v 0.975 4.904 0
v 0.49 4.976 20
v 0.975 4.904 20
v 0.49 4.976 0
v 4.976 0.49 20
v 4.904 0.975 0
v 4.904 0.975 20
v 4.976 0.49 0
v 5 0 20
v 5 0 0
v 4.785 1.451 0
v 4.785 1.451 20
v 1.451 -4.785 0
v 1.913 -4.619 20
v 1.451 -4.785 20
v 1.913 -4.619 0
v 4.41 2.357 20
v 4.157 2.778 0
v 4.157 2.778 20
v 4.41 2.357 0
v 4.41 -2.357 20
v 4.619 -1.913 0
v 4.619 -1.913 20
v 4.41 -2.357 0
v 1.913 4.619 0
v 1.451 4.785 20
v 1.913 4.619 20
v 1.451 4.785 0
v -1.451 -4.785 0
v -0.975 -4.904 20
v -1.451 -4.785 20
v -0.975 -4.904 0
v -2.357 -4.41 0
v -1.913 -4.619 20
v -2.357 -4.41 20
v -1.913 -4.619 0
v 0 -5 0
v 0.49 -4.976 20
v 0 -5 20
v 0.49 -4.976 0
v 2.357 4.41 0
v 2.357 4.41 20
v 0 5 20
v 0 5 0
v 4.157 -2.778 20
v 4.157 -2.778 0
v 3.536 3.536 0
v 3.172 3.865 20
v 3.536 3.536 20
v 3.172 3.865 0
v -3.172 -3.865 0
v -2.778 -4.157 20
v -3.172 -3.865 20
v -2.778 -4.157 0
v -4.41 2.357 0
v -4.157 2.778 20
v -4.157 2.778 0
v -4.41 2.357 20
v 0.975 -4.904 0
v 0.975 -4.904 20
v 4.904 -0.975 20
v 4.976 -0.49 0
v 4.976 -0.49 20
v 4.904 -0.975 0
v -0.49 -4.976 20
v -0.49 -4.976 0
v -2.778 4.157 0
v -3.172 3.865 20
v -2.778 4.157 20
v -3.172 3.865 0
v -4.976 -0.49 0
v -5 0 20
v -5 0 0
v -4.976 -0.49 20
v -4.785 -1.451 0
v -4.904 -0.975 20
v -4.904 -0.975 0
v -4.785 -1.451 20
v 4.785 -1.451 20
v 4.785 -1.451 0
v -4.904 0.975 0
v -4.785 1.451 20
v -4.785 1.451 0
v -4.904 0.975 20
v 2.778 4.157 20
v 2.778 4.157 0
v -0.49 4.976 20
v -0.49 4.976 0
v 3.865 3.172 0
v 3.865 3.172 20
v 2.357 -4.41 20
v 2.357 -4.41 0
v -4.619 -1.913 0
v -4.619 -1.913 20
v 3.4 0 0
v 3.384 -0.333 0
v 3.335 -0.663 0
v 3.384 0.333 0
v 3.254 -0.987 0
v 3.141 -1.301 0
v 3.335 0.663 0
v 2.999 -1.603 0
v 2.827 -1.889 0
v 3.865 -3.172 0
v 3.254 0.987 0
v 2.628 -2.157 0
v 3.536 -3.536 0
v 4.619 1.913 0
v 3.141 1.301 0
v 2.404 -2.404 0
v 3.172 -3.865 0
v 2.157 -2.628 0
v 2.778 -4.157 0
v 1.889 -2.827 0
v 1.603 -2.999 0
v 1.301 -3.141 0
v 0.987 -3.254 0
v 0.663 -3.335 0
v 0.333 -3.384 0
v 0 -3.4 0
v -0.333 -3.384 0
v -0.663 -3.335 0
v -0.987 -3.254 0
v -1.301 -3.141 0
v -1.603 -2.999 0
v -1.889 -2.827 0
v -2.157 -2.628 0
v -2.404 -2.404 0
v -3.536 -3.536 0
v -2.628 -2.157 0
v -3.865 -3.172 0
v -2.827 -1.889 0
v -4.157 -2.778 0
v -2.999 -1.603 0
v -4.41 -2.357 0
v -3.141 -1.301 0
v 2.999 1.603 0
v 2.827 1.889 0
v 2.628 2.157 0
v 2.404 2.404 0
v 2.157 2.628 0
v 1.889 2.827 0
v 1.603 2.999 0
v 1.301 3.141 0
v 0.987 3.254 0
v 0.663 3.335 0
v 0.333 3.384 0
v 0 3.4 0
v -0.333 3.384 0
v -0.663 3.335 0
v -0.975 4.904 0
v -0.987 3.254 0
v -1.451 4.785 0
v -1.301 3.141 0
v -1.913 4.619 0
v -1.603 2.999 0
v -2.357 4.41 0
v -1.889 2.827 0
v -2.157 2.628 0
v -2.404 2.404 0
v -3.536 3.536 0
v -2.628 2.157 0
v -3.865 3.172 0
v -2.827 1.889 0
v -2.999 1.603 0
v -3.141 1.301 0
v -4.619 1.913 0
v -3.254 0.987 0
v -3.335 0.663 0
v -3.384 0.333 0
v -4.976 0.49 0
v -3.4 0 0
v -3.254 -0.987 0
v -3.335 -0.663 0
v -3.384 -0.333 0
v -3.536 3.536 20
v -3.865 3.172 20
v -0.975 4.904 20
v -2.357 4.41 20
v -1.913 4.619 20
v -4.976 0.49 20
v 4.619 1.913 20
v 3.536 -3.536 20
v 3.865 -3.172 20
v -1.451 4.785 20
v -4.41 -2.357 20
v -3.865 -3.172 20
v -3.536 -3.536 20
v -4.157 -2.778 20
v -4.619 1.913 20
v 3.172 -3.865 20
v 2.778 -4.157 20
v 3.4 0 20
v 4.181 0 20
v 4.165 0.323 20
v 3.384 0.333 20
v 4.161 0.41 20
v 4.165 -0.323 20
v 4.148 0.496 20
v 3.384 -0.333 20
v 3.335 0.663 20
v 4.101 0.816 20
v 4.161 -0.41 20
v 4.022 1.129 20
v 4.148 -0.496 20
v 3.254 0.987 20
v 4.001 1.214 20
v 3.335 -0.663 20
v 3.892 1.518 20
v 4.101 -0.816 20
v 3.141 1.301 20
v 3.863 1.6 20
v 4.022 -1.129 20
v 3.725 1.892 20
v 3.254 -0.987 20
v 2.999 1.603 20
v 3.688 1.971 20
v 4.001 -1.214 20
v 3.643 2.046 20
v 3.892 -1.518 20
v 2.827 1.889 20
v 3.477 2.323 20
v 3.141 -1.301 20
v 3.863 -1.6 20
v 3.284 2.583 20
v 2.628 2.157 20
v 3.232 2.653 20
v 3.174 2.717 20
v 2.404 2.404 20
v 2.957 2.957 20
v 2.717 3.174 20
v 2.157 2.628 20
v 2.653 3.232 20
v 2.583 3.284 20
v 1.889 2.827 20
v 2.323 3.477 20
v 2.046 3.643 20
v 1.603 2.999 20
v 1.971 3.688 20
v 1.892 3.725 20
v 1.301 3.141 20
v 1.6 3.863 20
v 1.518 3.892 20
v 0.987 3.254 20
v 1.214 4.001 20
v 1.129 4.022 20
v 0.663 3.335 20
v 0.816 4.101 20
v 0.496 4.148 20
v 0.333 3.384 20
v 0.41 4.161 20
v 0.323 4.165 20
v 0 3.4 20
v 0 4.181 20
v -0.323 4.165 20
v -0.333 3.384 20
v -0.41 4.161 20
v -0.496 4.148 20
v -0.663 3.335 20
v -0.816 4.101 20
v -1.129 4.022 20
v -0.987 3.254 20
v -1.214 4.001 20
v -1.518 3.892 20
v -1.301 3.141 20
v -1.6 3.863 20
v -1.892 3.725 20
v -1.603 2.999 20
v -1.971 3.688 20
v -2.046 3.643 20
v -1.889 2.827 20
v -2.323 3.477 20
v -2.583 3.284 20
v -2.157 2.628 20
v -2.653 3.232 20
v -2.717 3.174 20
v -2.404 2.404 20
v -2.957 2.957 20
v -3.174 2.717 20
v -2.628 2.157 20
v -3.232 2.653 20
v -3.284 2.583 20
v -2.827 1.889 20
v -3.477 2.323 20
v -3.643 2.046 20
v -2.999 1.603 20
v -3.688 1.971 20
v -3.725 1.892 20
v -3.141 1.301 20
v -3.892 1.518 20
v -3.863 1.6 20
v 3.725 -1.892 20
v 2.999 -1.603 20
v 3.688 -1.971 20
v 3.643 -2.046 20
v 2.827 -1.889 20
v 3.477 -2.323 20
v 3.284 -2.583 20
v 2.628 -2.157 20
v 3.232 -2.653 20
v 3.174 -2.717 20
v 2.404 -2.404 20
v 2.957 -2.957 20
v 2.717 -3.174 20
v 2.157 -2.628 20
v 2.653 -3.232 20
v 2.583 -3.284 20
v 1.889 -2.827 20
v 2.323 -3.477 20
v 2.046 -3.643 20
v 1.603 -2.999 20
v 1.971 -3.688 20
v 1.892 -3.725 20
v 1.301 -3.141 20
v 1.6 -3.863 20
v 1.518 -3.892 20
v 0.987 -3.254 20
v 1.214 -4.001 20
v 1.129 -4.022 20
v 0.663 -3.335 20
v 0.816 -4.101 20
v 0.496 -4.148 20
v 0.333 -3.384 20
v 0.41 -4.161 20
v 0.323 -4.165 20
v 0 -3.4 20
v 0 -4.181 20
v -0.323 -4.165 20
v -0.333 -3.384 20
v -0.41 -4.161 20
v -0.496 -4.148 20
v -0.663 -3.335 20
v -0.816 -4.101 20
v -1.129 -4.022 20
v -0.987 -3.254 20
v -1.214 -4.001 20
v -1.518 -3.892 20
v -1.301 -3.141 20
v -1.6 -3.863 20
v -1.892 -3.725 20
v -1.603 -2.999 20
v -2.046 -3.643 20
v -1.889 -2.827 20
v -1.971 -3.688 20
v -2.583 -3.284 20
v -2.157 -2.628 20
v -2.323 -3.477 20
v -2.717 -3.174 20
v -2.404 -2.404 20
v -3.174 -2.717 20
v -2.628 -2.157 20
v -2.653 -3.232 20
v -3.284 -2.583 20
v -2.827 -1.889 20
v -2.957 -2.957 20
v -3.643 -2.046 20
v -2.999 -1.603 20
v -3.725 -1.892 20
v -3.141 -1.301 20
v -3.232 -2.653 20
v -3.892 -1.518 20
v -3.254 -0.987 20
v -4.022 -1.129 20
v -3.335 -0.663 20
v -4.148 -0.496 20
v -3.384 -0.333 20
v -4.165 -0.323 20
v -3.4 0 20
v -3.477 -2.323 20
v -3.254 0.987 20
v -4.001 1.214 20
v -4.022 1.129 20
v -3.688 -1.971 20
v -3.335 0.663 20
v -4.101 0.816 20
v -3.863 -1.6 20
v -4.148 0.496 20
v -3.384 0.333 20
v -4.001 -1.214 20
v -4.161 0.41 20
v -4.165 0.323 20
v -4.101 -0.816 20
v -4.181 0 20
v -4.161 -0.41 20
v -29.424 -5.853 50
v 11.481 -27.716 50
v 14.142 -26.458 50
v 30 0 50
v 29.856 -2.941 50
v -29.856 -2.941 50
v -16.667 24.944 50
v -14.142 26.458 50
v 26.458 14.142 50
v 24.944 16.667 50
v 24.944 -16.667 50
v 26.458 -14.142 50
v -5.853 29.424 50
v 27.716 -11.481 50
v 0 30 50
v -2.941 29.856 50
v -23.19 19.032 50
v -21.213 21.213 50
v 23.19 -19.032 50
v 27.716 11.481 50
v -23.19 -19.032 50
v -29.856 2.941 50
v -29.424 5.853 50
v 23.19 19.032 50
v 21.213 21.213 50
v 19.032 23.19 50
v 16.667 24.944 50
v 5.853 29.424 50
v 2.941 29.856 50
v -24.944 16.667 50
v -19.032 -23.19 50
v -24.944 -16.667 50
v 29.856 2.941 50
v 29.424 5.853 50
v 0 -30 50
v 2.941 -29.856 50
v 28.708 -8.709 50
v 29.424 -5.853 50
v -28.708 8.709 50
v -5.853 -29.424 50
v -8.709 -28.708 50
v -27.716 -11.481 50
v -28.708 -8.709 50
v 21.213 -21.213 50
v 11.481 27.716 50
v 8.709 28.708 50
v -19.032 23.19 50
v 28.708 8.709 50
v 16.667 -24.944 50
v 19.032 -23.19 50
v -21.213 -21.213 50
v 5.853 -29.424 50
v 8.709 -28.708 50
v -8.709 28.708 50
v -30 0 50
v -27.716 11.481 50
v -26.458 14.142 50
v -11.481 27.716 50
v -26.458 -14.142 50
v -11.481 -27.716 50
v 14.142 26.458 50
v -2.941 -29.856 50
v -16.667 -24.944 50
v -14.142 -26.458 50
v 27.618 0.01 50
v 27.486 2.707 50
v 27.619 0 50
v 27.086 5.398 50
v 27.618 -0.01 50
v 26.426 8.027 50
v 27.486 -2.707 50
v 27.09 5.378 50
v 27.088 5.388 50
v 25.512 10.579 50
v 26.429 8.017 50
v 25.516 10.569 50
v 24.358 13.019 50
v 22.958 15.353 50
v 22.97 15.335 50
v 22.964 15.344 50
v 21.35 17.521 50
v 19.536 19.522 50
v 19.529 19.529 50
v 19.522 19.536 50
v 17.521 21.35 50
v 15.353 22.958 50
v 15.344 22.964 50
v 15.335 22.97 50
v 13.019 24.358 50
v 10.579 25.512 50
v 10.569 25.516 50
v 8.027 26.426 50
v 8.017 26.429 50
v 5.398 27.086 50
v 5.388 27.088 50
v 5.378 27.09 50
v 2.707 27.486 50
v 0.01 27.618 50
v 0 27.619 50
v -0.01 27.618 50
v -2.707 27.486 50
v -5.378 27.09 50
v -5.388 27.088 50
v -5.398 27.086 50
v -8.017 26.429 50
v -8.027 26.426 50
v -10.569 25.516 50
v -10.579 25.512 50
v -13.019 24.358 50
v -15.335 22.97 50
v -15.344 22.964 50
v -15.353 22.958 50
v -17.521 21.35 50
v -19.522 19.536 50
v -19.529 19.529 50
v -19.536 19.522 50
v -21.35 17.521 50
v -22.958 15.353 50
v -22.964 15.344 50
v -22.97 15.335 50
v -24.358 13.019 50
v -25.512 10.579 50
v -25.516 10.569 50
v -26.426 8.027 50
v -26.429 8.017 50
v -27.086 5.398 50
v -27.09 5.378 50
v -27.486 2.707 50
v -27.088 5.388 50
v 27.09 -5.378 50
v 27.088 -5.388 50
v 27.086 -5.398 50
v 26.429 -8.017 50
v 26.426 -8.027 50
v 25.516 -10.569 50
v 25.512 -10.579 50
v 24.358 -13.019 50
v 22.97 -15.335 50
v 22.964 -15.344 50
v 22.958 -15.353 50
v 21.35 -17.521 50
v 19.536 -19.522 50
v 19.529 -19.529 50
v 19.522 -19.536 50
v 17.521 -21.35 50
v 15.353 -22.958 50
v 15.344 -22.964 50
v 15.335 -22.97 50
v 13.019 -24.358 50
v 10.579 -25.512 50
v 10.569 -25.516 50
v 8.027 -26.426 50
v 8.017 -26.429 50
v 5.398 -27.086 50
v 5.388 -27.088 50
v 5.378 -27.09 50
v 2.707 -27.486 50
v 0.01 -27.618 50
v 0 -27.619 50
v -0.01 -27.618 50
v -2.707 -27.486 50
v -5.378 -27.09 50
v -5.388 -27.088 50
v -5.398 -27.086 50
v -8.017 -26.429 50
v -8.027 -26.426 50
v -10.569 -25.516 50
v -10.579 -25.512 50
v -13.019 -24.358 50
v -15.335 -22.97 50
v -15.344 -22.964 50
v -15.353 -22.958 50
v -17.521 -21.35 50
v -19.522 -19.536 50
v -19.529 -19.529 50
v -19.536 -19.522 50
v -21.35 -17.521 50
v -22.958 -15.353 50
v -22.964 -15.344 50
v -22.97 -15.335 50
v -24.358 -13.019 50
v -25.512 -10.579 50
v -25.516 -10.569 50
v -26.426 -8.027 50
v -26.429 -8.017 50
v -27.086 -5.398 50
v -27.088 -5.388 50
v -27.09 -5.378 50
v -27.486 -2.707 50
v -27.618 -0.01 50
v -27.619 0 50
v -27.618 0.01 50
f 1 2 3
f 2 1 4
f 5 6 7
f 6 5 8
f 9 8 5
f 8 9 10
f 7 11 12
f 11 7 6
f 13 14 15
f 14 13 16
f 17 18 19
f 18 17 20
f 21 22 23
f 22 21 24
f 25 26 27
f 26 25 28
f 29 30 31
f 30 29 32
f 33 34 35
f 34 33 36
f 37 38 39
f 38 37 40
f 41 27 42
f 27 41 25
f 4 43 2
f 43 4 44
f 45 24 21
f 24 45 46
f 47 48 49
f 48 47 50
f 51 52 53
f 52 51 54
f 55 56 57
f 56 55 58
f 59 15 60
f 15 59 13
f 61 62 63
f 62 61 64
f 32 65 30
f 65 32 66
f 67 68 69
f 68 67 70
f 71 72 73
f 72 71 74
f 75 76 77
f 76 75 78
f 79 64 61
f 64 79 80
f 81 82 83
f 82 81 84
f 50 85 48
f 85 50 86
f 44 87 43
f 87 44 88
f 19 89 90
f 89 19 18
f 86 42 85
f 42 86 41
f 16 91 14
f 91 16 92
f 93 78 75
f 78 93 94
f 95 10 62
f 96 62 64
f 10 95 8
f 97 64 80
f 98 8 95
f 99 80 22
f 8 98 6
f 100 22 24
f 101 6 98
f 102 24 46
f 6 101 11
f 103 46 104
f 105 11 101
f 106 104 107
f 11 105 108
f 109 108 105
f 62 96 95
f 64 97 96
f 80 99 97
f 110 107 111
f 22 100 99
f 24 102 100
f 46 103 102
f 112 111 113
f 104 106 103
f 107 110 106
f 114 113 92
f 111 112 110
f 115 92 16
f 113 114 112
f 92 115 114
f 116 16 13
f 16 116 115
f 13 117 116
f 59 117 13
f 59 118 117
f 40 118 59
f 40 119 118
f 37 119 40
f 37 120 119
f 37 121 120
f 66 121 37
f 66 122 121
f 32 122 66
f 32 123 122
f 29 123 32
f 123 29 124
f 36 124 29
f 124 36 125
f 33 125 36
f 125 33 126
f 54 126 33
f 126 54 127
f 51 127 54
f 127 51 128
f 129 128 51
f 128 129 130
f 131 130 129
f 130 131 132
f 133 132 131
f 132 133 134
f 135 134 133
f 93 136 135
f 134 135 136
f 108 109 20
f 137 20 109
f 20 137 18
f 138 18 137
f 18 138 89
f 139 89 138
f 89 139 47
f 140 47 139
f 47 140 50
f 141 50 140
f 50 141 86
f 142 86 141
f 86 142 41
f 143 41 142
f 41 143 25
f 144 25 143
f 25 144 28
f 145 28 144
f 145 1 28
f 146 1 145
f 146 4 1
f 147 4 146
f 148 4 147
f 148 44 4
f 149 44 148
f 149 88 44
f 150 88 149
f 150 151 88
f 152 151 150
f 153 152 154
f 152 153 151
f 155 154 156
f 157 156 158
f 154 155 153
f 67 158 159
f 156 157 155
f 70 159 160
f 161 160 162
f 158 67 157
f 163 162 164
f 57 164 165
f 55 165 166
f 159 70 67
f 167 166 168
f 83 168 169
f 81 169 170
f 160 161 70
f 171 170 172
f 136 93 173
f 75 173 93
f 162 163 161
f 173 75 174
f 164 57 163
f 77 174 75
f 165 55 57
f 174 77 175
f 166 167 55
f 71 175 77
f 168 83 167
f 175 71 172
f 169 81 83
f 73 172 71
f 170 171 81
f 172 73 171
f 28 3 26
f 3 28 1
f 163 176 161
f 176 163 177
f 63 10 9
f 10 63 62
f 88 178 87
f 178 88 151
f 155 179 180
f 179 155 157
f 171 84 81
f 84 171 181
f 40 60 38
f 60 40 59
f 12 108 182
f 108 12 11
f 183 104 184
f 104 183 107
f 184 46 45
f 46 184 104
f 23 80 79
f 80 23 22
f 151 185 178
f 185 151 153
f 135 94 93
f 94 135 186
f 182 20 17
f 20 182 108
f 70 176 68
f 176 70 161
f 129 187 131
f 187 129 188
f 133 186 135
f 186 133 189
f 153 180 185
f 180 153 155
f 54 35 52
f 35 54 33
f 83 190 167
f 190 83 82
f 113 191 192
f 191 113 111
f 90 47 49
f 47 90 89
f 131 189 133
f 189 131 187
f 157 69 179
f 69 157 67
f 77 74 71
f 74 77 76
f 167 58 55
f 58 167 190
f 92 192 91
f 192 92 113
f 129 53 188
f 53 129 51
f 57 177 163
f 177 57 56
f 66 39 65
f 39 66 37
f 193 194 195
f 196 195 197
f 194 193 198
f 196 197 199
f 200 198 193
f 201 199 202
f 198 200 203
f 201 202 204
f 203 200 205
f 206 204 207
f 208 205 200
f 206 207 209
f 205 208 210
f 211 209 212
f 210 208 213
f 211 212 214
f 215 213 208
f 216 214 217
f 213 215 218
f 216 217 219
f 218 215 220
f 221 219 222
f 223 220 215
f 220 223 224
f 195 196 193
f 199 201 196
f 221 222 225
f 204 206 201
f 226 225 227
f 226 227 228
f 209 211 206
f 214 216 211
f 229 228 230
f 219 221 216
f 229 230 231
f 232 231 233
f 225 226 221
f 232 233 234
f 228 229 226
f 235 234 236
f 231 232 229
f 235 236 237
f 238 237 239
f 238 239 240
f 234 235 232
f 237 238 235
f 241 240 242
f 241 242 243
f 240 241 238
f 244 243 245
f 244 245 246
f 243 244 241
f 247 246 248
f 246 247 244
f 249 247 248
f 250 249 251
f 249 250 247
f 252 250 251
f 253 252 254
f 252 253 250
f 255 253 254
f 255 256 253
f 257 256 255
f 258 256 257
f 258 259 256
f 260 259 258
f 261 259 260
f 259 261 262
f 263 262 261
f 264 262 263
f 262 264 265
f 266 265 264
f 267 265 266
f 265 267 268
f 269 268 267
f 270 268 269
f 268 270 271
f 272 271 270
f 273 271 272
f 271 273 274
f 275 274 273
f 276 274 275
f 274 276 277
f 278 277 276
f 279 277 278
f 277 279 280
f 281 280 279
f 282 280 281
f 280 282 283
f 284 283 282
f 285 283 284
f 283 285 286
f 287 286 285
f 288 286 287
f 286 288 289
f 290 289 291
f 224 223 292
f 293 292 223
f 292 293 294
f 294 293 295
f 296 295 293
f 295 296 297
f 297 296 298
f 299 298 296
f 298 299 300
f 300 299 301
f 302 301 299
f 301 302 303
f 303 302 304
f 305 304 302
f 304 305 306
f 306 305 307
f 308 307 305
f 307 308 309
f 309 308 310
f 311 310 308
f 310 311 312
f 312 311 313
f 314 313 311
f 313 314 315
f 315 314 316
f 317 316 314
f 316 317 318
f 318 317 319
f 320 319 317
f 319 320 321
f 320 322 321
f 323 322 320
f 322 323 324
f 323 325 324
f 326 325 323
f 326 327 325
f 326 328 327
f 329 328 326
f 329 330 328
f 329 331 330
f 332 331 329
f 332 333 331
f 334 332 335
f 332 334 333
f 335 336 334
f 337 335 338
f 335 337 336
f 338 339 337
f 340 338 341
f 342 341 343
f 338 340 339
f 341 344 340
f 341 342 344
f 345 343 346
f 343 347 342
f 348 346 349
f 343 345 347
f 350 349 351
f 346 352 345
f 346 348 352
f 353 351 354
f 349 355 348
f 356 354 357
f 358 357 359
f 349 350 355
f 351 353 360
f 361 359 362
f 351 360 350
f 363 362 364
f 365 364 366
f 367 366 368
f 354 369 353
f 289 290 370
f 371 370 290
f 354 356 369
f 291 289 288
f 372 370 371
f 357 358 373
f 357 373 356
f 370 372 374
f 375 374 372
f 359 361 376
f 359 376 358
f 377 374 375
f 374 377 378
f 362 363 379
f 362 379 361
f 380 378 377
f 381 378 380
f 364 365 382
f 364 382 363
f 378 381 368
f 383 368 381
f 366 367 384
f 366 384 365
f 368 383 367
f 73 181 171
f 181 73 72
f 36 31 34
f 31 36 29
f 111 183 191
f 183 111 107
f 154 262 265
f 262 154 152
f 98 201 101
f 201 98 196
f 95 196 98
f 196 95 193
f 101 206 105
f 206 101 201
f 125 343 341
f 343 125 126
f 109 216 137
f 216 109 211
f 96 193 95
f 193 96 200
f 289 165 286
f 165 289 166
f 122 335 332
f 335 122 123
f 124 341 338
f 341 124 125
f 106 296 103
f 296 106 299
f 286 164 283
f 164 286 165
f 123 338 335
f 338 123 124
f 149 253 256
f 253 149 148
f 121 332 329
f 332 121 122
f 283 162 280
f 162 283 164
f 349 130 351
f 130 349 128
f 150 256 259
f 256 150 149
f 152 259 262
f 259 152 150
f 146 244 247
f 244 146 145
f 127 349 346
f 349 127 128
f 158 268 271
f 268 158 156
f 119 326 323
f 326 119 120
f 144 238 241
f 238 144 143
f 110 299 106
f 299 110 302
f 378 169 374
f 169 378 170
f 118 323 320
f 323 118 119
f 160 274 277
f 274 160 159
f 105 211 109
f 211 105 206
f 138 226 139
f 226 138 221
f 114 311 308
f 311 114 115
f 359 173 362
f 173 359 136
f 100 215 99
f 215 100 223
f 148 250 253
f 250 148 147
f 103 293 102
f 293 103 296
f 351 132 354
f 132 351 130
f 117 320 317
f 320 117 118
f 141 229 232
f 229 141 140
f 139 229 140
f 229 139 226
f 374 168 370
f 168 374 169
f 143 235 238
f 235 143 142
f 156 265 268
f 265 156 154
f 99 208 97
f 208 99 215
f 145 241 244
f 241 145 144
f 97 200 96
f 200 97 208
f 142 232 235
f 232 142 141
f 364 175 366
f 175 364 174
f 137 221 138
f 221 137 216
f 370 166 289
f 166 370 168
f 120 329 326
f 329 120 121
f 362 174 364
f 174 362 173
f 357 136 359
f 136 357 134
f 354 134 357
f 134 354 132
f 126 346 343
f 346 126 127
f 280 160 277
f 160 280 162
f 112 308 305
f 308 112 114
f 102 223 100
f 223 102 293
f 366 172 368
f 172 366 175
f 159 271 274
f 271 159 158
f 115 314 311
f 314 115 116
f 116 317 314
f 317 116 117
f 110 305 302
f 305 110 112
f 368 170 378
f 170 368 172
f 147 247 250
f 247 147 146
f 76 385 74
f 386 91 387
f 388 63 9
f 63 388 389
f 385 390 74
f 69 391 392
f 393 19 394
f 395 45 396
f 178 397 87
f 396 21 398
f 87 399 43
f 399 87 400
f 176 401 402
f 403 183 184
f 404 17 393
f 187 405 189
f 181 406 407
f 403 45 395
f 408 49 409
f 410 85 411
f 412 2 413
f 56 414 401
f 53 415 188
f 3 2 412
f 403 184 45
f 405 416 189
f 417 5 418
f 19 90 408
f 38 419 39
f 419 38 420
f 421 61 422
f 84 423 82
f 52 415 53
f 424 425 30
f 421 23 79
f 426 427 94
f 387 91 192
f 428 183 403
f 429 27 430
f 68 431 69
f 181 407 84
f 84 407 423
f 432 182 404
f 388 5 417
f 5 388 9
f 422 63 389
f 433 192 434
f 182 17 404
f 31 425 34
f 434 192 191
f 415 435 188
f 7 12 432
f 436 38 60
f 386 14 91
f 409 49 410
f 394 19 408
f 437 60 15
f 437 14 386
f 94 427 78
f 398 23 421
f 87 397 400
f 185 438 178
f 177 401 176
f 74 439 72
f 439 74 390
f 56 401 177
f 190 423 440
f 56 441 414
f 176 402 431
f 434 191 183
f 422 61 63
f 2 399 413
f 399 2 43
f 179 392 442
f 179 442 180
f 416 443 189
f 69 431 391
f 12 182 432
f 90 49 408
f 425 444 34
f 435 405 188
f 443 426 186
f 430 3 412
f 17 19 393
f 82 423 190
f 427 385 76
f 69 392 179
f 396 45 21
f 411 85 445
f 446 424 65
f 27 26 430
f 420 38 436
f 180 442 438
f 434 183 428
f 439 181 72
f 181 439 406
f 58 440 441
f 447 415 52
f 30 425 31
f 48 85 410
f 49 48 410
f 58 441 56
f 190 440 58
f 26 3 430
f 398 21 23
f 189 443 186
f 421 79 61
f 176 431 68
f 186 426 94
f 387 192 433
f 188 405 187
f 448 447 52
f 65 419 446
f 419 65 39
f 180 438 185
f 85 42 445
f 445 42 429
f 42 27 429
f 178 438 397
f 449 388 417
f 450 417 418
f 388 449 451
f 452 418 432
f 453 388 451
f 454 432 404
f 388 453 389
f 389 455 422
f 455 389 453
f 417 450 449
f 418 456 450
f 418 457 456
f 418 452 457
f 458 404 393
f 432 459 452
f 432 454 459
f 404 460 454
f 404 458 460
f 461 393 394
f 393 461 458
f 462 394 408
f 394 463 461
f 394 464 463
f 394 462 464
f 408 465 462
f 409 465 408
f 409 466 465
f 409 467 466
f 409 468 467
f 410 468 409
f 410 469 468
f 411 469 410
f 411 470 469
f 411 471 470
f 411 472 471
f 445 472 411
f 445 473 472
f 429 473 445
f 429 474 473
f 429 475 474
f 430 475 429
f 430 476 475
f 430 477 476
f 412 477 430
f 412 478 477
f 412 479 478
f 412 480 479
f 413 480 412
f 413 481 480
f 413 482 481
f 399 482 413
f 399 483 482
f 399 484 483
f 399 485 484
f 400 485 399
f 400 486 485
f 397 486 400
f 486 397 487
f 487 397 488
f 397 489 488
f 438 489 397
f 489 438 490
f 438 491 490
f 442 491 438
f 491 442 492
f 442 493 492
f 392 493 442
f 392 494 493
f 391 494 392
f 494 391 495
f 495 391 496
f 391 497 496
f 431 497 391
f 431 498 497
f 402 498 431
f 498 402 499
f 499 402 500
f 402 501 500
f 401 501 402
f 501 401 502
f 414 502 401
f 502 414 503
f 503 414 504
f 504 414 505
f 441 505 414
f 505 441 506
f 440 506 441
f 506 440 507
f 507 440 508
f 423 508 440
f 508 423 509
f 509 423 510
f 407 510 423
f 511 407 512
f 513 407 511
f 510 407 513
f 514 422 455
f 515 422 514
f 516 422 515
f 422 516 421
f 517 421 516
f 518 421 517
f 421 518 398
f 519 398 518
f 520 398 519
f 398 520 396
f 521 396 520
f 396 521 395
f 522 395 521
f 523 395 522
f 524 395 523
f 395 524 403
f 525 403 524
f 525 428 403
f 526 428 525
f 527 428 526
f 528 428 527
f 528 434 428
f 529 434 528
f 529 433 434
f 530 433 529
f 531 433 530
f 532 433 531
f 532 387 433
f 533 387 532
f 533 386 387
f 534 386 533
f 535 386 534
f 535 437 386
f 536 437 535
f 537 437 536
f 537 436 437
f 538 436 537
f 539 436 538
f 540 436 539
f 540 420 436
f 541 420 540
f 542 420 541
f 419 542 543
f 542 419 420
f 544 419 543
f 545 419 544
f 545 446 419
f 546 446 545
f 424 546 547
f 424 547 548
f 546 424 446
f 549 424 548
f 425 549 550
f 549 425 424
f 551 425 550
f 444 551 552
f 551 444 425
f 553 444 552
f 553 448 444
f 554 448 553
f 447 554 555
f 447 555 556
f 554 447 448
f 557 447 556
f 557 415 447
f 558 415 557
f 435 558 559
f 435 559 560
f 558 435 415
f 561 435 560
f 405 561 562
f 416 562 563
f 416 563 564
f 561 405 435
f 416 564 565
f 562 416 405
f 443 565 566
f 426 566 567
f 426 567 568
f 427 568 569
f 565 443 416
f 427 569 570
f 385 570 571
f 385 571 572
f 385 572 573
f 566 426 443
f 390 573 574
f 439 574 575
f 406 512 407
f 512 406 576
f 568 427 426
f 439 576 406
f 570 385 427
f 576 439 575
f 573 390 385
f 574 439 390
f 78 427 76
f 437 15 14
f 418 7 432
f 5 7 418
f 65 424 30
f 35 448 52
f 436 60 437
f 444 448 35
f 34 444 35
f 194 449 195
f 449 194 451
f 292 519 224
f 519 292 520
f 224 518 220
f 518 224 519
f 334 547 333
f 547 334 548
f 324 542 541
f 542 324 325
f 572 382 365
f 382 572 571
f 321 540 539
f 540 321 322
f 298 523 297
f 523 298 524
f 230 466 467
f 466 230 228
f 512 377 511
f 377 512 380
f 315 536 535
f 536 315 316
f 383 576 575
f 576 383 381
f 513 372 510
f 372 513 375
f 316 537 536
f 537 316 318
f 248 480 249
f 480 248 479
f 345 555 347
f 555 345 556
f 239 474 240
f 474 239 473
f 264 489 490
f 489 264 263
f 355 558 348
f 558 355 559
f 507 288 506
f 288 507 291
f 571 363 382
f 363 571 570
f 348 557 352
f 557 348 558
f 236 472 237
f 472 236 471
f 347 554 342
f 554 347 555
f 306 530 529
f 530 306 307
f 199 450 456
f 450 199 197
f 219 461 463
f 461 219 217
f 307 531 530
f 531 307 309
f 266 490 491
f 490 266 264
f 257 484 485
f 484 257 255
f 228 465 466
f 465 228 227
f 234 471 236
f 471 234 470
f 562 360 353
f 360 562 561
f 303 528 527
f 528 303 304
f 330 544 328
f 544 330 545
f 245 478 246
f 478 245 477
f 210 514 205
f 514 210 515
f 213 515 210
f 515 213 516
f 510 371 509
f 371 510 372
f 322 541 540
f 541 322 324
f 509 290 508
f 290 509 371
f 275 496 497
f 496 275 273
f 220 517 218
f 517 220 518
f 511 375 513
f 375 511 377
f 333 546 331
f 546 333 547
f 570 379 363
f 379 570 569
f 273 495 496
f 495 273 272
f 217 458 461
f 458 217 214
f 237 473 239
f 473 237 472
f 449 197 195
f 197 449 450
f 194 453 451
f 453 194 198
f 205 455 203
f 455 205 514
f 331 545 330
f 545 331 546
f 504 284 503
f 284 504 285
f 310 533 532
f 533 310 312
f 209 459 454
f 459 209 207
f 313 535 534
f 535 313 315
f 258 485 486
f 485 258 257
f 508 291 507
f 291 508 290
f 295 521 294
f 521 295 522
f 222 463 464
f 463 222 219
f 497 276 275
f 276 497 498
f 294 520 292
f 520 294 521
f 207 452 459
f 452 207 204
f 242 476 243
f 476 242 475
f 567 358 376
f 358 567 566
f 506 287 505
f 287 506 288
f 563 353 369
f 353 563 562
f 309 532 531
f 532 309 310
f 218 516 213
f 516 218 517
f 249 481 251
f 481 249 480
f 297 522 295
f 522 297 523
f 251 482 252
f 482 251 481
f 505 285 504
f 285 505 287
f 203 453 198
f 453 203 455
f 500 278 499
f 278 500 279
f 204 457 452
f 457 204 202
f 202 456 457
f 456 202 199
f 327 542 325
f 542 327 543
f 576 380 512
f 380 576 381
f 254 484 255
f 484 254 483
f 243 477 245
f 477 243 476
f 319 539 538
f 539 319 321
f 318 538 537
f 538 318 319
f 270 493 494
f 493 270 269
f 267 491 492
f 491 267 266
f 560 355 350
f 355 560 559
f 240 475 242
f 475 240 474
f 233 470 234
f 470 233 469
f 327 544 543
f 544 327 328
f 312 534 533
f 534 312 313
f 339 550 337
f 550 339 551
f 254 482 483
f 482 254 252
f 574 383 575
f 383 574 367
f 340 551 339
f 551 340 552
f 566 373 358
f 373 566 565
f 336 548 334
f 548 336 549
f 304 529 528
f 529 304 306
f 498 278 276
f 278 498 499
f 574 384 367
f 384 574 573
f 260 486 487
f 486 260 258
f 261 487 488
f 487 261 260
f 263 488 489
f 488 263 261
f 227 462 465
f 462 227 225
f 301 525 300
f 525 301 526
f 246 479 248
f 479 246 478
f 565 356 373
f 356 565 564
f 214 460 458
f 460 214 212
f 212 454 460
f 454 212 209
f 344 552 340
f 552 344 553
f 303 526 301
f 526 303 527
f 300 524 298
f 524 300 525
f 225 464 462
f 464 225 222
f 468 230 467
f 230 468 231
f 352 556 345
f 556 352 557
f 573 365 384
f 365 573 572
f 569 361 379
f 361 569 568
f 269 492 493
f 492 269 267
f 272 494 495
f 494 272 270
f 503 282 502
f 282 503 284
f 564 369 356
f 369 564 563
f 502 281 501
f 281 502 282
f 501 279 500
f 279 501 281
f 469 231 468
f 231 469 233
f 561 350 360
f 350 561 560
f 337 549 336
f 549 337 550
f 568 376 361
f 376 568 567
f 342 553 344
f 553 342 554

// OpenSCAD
// Funnel - a straight spout topped with a conical bowl, printed upright. NOVEL general part.
//

spout_d   = 10;
spout_h   = 20;
cone_d0   = 10;
cone_d1   = 60;
cone_h    = 30;
wall      = 1.6;

$fn = 64;

bore = spout_d - 2 * wall;

union() {
    difference() {
        cylinder(h = spout_h, d = spout_d);
        translate([0, 0, -1]) cylinder(h = spout_h + 2, d = bore);
    }
    difference() {
        translate([0, 0, spout_h]) cylinder(h = cone_h, d1 = cone_d0, d2 = cone_d1);
        translate([0, 0, spout_h - 1]) cylinder(h = cone_h + 2,
            d1 = cone_d0 - 2 * wall, d2 = cone_d1 - 2 * wall);
    }
}
